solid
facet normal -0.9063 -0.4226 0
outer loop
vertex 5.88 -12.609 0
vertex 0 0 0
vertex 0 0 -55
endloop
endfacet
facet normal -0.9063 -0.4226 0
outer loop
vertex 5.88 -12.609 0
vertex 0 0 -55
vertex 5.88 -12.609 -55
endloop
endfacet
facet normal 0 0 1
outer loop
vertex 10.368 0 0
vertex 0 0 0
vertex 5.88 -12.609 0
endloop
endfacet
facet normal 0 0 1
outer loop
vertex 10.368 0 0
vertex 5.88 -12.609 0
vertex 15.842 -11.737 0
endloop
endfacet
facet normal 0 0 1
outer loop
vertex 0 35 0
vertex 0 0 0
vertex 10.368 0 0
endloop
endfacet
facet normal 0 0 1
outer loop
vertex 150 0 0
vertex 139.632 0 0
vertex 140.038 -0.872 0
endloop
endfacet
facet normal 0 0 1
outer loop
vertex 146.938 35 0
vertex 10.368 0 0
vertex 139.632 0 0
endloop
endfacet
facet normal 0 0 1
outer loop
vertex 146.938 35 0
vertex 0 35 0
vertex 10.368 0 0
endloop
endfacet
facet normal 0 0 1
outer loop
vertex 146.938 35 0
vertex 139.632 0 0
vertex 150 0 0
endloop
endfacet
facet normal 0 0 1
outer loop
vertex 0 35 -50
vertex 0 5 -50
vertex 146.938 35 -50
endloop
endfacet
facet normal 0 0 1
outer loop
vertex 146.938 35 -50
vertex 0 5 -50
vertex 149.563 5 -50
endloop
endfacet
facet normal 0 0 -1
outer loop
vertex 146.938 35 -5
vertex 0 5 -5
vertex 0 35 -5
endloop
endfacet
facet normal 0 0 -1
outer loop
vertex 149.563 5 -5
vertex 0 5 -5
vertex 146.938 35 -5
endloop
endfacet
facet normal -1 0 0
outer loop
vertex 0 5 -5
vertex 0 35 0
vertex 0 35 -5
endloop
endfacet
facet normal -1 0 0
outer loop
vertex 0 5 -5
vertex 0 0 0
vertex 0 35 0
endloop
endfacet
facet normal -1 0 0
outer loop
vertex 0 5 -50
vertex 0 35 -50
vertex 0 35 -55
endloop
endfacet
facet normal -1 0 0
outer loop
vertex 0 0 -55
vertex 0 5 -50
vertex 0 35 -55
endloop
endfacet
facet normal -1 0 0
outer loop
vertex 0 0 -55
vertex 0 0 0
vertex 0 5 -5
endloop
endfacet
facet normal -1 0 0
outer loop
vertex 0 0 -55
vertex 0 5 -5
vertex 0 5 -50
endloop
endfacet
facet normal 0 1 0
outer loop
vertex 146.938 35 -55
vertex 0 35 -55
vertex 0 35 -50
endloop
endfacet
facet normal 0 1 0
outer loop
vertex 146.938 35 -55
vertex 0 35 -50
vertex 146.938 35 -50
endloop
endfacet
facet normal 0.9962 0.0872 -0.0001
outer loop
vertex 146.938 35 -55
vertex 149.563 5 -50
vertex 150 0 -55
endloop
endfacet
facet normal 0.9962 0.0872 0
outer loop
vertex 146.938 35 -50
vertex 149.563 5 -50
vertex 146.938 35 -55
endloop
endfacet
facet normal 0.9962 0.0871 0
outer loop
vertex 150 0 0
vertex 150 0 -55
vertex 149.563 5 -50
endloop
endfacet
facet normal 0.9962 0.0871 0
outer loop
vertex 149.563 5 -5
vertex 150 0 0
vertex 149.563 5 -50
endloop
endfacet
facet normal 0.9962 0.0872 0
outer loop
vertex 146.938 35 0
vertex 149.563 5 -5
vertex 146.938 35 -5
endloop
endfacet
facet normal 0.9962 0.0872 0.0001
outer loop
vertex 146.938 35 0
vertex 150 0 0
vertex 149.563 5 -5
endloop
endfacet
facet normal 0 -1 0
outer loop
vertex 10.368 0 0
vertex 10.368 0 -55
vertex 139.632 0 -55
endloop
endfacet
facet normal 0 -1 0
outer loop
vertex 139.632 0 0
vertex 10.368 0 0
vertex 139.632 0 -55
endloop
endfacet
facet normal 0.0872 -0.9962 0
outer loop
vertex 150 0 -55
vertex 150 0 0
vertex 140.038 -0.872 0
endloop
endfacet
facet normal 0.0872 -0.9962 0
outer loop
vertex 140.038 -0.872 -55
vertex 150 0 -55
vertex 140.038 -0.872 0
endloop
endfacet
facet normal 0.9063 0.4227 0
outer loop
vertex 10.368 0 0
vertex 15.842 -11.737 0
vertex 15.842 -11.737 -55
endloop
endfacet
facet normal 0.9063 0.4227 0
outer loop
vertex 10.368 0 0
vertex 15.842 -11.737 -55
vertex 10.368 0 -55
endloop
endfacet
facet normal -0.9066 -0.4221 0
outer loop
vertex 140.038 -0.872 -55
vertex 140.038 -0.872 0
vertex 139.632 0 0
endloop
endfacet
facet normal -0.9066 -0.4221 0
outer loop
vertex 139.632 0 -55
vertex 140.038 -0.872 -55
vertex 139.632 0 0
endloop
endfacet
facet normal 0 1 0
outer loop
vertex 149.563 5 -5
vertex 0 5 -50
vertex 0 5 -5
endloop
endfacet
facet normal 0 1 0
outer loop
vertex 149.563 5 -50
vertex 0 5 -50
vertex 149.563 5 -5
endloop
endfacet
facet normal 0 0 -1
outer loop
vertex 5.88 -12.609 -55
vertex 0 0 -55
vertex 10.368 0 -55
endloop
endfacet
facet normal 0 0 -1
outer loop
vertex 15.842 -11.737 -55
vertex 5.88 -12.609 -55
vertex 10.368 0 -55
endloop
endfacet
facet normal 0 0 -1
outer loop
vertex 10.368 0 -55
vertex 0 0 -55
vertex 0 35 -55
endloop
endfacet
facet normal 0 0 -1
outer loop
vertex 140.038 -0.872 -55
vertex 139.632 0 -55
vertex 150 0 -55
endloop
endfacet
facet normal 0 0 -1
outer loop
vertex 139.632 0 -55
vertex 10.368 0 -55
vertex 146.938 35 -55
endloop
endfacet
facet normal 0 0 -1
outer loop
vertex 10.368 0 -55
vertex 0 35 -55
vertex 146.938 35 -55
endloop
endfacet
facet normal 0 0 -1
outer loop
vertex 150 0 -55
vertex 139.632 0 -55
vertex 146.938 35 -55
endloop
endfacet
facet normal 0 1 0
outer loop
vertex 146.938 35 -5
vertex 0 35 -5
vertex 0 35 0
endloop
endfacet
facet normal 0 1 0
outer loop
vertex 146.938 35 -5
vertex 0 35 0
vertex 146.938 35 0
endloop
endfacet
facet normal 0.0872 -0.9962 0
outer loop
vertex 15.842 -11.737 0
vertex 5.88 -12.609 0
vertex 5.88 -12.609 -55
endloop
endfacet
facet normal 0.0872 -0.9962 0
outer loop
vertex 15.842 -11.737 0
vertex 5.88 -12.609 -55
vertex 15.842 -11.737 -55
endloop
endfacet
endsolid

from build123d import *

# Parameters (mm, degrees)
ESQUISSE2_W             = 150
ESQUISSE2_H             = 55
BOSS_EXTRU_1_DEPTH      = 5
ESQUISSE3_W             = 150
ESQUISSE3_H             = 5
BOSS_EXTRU_2_DEPTH      = 30
BOSS_EXTRU_3_DEPTH      = 55
ENL_V_MAT_EXTRU_1_DEPTH = 164.554272338


with BuildPart() as part:
    # Esquisse2 → Boss.-Extru.1 (new body)
    with BuildSketch(Plane(origin=(0, 0, 0), x_dir=(1, 0, 0), z_dir=(0, 1, 0))):
        with Locations((75, 27.5)):
            Rectangle(ESQUISSE2_W, ESQUISSE2_H)
    extrude(amount=BOSS_EXTRU_1_DEPTH)

    # Esquisse3 → Boss.-Extru.2 (add)
    with BuildSketch(Plane(origin=(0, 5, 0), x_dir=(1, 0, 0), z_dir=(0, 1, 0))):
        with Locations((75, 2.5)):
            Rectangle(ESQUISSE3_W, ESQUISSE3_H)
        with Locations((75, 52.5)):
            Rectangle(ESQUISSE3_W, ESQUISSE3_H)
    extrude(amount=BOSS_EXTRU_2_DEPTH)

    # Esquisse4 → Boss.-Extru.3 (add)
    with BuildSketch(Plane.XY):
        Polygon((0, 0), (5.879626117, -12.608898898), (15.841573098, -11.73734147), (10.368360884, 0), align=None)
        Polygon((150, 0), (140.038053019, -0.871557427), (139.631639116, 0), align=None)
    extrude(amount=-BOSS_EXTRU_3_DEPTH)

    # Esquisse5 → Enlèv. mat.-Extru.1 (cut, through all)
    with BuildSketch(Plane.XY):
        Polygon((150, 0), (146.937896777, 35), (150, 35), align=None)
    extrude(amount=-ENL_V_MAT_EXTRU_1_DEPTH, mode=Mode.SUBTRACT)


solid = part.part
